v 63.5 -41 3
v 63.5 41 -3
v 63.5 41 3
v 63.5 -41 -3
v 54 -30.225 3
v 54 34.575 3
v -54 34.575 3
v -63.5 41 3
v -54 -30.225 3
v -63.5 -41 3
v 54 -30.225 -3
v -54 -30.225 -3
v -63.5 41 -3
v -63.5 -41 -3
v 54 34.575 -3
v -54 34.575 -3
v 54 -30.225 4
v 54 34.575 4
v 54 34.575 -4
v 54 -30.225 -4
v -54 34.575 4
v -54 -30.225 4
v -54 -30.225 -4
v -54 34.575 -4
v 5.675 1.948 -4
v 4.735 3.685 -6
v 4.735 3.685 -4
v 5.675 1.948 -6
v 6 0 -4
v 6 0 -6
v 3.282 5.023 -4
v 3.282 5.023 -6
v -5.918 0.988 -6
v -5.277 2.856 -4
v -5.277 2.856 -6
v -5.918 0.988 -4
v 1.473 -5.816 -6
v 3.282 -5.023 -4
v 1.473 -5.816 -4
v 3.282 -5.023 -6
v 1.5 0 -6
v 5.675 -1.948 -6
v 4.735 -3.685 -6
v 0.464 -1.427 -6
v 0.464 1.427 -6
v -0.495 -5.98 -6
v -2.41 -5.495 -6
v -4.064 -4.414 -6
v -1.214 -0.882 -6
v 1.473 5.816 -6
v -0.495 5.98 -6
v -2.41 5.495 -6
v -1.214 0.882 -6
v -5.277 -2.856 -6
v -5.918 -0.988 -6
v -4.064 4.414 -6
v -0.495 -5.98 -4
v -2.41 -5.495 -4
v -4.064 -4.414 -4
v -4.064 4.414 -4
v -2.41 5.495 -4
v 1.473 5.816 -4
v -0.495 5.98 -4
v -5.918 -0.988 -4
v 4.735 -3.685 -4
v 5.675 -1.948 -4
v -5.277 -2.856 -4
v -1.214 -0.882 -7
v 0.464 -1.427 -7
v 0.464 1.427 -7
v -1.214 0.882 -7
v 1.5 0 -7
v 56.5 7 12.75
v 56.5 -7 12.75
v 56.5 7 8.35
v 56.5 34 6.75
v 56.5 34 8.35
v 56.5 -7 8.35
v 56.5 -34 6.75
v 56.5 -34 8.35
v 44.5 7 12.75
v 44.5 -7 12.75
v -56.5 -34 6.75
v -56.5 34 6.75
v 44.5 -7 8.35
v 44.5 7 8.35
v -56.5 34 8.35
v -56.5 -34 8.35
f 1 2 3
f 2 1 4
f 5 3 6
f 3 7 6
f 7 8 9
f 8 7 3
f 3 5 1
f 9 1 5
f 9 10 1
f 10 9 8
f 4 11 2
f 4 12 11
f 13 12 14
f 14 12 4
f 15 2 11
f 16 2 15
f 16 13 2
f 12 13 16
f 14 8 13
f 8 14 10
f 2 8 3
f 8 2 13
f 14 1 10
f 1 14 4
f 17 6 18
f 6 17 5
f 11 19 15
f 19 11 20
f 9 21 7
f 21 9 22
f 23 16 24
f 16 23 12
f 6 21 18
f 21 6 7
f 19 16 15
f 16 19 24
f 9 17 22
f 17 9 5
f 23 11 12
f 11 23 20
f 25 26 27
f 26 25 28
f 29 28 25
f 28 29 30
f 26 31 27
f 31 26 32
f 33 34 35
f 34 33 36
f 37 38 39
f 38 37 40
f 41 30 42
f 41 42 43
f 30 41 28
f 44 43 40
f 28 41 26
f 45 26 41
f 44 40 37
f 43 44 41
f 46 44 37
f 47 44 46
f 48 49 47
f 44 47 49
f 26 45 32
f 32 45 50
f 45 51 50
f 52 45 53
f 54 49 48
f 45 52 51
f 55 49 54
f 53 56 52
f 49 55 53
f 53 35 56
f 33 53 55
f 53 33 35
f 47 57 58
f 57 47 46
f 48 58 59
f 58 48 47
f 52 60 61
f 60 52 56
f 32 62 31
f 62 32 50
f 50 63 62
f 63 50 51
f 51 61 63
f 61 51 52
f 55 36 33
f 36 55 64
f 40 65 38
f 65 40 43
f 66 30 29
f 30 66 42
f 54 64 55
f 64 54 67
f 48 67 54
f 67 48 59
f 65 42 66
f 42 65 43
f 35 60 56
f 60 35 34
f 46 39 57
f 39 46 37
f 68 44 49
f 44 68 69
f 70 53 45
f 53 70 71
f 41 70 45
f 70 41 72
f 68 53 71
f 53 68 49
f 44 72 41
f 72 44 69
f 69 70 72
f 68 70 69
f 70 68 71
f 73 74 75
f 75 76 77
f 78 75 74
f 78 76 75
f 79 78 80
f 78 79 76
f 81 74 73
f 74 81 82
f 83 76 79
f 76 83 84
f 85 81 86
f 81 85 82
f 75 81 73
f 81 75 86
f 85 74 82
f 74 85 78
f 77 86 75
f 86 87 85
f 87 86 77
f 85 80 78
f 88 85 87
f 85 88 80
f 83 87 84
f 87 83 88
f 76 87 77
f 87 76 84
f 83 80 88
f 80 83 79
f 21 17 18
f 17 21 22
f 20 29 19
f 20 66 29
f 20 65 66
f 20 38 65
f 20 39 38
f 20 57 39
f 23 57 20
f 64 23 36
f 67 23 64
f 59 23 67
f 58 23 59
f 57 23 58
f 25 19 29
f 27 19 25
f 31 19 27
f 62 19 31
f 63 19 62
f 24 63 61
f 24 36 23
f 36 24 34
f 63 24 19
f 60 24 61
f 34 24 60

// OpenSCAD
// Parameters
display_width_mm = 121; //[60.5:242:1]
display_height_mm = 76; //[38:152:1]
display_thickness_mm = 2.85; //[1.4:5.7:0.05]
pcb_offset_x_mm = 0; //[-10:10:0.5]
pcb_offset_y_mm = 0; //[-10:10:0.5]
pcb_offset_z_mm = 1.9; //[0:6:0.1]
aperture_min_x_mm = -54; //[-108:-27:0.5]
aperture_min_y_mm = -30.225; //[-60.45:-15.1125:0.5]
aperture_max_x_mm = 54; //[27:108:0.5]
aperture_max_y_mm = 34.575; //[17.2875:69.15:0.5]
aperture_depth_mm = 0.5; //[0.25:2:0.05]
touch_min_x_mm = -58.7; //[-117.4:-29.35:0.5]
touch_min_y_mm = -34; //[-68:-17:0.5]
touch_max_x_mm = 58.7; //[29.35:117.4:0.5]
touch_max_y_mm = 36.25; //[18.125:72.5:0.5]
touch_thickness_mm = 1; //[0.5:3:0.05]
thread_length_mm = 2; //[1:6:0.25]
ts_ribbon_min_x_mm = -2.5; //[-10:0:0.5]
ts_ribbon_min_y_mm = -39; //[-78:-19.5:0.5]
ts_ribbon_max_x_mm = 10.5; //[5.25:21:0.5]
ts_ribbon_max_y_mm = -33; //[-66:-16.5:0.5]
bezel_wall_mm = 3; //[1.5:8:0.5]
bezel_thickness_mm = 6; //[3:15:0.5]
pcb_thickness_mm = 1.6; //[0.8:3.2:0.1]
pcb_margin_mm = 4; //[2:12:0.5]
hdmi_width_mm = 14; //[7:28:0.5]
hdmi_height_mm = 6; //[3:12:0.5]
hdmi_depth_mm = 12; //[6:24:0.5]
screw_knob_radius_mm = 6; //[3:12:0.5]
screw_knob_height_mm = 4; //[2:10:0.5]
screw_shaft_radius_mm = 1.5; //[0.8:3:0.1]
overlap_mm = 1; //[0.5:2:0.1]

// Display - complete geometry
module display() {
  color([0.85, 0.85, 0.8]) {
    difference() {
      // Main display body
      cube([display_width_mm + 2*bezel_wall_mm, display_height_mm + 2*bezel_wall_mm, bezel_thickness_mm], center=true);
      // Front aperture cutout
      translate([(aperture_min_x_mm + aperture_max_x_mm)/2, (aperture_min_y_mm + aperture_max_y_mm)/2, bezel_thickness_mm/2 - (aperture_depth_mm + overlap_mm)/2])
        cube([aperture_max_x_mm - aperture_min_x_mm, aperture_max_y_mm - aperture_min_y_mm, aperture_depth_mm + overlap_mm], center=true);
    }
  }
}

// HDMI - complete geometry
module hdmi() {
  color([0.1, 0.1, 0.6]) {
    translate([(display_width_mm - 2*pcb_margin_mm)/2 - hdmi_depth_mm/2 + pcb_offset_x_mm, pcb_offset_y_mm, bezel_thickness_mm/2 + display_thickness_mm + pcb_offset_z_mm + hdmi_height_mm/2 - overlap_mm])
      cube([hdmi_depth_mm, hdmi_width_mm, hdmi_height_mm], center=true);
  }
}

// PCB - complete geometry
module pcb() {
  color([0.0, 0.4, 0.2]) {
    translate([pcb_offset_x_mm, pcb_offset_y_mm, bezel_thickness_mm/2 + display_thickness_mm + pcb_offset_z_mm + pcb_thickness_mm/2 - overlap_mm])
      cube([display_width_mm - 2*pcb_margin_mm, display_height_mm - 2*pcb_margin_mm, pcb_thickness_mm], center=true);
  }
}

// Display Aperture - complete geometry
module display_aperture() {
  color([0.85, 0.85, 0.8]) {
    translate([(aperture_min_x_mm + aperture_max_x_mm)/2, (aperture_min_y_mm + aperture_max_y_mm)/2, 0])
      cube([aperture_max_x_mm - aperture_min_x_mm, aperture_max_y_mm - aperture_min_y_mm, bezel_thickness_mm + 2*overlap_mm], center=true);
  }
}

// Screw Knob Assembly - complete geometry
module screw_knob_assembly() {
  color([0.2, 0.2, 0.2]) {
    union() {
      // Knob
      translate([0, 0, -bezel_thickness_mm/2 - screw_knob_height_mm/2 + overlap_mm])
        cylinder(r=screw_knob_radius_mm, h=screw_knob_height_mm, center=true);
      // Shaft
      translate([0, 0, -bezel_thickness_mm/2 + (thread_length_mm - screw_knob_height_mm)/2])
        cylinder(r=screw_shaft_radius_mm, h=thread_length_mm + screw_knob_height_mm, center=true);
    }
  }
}

// Assembly
module assembly() {
  display();
  hdmi();
  pcb();
  display_aperture();
  screw_knob_assembly();
}

assembly();
